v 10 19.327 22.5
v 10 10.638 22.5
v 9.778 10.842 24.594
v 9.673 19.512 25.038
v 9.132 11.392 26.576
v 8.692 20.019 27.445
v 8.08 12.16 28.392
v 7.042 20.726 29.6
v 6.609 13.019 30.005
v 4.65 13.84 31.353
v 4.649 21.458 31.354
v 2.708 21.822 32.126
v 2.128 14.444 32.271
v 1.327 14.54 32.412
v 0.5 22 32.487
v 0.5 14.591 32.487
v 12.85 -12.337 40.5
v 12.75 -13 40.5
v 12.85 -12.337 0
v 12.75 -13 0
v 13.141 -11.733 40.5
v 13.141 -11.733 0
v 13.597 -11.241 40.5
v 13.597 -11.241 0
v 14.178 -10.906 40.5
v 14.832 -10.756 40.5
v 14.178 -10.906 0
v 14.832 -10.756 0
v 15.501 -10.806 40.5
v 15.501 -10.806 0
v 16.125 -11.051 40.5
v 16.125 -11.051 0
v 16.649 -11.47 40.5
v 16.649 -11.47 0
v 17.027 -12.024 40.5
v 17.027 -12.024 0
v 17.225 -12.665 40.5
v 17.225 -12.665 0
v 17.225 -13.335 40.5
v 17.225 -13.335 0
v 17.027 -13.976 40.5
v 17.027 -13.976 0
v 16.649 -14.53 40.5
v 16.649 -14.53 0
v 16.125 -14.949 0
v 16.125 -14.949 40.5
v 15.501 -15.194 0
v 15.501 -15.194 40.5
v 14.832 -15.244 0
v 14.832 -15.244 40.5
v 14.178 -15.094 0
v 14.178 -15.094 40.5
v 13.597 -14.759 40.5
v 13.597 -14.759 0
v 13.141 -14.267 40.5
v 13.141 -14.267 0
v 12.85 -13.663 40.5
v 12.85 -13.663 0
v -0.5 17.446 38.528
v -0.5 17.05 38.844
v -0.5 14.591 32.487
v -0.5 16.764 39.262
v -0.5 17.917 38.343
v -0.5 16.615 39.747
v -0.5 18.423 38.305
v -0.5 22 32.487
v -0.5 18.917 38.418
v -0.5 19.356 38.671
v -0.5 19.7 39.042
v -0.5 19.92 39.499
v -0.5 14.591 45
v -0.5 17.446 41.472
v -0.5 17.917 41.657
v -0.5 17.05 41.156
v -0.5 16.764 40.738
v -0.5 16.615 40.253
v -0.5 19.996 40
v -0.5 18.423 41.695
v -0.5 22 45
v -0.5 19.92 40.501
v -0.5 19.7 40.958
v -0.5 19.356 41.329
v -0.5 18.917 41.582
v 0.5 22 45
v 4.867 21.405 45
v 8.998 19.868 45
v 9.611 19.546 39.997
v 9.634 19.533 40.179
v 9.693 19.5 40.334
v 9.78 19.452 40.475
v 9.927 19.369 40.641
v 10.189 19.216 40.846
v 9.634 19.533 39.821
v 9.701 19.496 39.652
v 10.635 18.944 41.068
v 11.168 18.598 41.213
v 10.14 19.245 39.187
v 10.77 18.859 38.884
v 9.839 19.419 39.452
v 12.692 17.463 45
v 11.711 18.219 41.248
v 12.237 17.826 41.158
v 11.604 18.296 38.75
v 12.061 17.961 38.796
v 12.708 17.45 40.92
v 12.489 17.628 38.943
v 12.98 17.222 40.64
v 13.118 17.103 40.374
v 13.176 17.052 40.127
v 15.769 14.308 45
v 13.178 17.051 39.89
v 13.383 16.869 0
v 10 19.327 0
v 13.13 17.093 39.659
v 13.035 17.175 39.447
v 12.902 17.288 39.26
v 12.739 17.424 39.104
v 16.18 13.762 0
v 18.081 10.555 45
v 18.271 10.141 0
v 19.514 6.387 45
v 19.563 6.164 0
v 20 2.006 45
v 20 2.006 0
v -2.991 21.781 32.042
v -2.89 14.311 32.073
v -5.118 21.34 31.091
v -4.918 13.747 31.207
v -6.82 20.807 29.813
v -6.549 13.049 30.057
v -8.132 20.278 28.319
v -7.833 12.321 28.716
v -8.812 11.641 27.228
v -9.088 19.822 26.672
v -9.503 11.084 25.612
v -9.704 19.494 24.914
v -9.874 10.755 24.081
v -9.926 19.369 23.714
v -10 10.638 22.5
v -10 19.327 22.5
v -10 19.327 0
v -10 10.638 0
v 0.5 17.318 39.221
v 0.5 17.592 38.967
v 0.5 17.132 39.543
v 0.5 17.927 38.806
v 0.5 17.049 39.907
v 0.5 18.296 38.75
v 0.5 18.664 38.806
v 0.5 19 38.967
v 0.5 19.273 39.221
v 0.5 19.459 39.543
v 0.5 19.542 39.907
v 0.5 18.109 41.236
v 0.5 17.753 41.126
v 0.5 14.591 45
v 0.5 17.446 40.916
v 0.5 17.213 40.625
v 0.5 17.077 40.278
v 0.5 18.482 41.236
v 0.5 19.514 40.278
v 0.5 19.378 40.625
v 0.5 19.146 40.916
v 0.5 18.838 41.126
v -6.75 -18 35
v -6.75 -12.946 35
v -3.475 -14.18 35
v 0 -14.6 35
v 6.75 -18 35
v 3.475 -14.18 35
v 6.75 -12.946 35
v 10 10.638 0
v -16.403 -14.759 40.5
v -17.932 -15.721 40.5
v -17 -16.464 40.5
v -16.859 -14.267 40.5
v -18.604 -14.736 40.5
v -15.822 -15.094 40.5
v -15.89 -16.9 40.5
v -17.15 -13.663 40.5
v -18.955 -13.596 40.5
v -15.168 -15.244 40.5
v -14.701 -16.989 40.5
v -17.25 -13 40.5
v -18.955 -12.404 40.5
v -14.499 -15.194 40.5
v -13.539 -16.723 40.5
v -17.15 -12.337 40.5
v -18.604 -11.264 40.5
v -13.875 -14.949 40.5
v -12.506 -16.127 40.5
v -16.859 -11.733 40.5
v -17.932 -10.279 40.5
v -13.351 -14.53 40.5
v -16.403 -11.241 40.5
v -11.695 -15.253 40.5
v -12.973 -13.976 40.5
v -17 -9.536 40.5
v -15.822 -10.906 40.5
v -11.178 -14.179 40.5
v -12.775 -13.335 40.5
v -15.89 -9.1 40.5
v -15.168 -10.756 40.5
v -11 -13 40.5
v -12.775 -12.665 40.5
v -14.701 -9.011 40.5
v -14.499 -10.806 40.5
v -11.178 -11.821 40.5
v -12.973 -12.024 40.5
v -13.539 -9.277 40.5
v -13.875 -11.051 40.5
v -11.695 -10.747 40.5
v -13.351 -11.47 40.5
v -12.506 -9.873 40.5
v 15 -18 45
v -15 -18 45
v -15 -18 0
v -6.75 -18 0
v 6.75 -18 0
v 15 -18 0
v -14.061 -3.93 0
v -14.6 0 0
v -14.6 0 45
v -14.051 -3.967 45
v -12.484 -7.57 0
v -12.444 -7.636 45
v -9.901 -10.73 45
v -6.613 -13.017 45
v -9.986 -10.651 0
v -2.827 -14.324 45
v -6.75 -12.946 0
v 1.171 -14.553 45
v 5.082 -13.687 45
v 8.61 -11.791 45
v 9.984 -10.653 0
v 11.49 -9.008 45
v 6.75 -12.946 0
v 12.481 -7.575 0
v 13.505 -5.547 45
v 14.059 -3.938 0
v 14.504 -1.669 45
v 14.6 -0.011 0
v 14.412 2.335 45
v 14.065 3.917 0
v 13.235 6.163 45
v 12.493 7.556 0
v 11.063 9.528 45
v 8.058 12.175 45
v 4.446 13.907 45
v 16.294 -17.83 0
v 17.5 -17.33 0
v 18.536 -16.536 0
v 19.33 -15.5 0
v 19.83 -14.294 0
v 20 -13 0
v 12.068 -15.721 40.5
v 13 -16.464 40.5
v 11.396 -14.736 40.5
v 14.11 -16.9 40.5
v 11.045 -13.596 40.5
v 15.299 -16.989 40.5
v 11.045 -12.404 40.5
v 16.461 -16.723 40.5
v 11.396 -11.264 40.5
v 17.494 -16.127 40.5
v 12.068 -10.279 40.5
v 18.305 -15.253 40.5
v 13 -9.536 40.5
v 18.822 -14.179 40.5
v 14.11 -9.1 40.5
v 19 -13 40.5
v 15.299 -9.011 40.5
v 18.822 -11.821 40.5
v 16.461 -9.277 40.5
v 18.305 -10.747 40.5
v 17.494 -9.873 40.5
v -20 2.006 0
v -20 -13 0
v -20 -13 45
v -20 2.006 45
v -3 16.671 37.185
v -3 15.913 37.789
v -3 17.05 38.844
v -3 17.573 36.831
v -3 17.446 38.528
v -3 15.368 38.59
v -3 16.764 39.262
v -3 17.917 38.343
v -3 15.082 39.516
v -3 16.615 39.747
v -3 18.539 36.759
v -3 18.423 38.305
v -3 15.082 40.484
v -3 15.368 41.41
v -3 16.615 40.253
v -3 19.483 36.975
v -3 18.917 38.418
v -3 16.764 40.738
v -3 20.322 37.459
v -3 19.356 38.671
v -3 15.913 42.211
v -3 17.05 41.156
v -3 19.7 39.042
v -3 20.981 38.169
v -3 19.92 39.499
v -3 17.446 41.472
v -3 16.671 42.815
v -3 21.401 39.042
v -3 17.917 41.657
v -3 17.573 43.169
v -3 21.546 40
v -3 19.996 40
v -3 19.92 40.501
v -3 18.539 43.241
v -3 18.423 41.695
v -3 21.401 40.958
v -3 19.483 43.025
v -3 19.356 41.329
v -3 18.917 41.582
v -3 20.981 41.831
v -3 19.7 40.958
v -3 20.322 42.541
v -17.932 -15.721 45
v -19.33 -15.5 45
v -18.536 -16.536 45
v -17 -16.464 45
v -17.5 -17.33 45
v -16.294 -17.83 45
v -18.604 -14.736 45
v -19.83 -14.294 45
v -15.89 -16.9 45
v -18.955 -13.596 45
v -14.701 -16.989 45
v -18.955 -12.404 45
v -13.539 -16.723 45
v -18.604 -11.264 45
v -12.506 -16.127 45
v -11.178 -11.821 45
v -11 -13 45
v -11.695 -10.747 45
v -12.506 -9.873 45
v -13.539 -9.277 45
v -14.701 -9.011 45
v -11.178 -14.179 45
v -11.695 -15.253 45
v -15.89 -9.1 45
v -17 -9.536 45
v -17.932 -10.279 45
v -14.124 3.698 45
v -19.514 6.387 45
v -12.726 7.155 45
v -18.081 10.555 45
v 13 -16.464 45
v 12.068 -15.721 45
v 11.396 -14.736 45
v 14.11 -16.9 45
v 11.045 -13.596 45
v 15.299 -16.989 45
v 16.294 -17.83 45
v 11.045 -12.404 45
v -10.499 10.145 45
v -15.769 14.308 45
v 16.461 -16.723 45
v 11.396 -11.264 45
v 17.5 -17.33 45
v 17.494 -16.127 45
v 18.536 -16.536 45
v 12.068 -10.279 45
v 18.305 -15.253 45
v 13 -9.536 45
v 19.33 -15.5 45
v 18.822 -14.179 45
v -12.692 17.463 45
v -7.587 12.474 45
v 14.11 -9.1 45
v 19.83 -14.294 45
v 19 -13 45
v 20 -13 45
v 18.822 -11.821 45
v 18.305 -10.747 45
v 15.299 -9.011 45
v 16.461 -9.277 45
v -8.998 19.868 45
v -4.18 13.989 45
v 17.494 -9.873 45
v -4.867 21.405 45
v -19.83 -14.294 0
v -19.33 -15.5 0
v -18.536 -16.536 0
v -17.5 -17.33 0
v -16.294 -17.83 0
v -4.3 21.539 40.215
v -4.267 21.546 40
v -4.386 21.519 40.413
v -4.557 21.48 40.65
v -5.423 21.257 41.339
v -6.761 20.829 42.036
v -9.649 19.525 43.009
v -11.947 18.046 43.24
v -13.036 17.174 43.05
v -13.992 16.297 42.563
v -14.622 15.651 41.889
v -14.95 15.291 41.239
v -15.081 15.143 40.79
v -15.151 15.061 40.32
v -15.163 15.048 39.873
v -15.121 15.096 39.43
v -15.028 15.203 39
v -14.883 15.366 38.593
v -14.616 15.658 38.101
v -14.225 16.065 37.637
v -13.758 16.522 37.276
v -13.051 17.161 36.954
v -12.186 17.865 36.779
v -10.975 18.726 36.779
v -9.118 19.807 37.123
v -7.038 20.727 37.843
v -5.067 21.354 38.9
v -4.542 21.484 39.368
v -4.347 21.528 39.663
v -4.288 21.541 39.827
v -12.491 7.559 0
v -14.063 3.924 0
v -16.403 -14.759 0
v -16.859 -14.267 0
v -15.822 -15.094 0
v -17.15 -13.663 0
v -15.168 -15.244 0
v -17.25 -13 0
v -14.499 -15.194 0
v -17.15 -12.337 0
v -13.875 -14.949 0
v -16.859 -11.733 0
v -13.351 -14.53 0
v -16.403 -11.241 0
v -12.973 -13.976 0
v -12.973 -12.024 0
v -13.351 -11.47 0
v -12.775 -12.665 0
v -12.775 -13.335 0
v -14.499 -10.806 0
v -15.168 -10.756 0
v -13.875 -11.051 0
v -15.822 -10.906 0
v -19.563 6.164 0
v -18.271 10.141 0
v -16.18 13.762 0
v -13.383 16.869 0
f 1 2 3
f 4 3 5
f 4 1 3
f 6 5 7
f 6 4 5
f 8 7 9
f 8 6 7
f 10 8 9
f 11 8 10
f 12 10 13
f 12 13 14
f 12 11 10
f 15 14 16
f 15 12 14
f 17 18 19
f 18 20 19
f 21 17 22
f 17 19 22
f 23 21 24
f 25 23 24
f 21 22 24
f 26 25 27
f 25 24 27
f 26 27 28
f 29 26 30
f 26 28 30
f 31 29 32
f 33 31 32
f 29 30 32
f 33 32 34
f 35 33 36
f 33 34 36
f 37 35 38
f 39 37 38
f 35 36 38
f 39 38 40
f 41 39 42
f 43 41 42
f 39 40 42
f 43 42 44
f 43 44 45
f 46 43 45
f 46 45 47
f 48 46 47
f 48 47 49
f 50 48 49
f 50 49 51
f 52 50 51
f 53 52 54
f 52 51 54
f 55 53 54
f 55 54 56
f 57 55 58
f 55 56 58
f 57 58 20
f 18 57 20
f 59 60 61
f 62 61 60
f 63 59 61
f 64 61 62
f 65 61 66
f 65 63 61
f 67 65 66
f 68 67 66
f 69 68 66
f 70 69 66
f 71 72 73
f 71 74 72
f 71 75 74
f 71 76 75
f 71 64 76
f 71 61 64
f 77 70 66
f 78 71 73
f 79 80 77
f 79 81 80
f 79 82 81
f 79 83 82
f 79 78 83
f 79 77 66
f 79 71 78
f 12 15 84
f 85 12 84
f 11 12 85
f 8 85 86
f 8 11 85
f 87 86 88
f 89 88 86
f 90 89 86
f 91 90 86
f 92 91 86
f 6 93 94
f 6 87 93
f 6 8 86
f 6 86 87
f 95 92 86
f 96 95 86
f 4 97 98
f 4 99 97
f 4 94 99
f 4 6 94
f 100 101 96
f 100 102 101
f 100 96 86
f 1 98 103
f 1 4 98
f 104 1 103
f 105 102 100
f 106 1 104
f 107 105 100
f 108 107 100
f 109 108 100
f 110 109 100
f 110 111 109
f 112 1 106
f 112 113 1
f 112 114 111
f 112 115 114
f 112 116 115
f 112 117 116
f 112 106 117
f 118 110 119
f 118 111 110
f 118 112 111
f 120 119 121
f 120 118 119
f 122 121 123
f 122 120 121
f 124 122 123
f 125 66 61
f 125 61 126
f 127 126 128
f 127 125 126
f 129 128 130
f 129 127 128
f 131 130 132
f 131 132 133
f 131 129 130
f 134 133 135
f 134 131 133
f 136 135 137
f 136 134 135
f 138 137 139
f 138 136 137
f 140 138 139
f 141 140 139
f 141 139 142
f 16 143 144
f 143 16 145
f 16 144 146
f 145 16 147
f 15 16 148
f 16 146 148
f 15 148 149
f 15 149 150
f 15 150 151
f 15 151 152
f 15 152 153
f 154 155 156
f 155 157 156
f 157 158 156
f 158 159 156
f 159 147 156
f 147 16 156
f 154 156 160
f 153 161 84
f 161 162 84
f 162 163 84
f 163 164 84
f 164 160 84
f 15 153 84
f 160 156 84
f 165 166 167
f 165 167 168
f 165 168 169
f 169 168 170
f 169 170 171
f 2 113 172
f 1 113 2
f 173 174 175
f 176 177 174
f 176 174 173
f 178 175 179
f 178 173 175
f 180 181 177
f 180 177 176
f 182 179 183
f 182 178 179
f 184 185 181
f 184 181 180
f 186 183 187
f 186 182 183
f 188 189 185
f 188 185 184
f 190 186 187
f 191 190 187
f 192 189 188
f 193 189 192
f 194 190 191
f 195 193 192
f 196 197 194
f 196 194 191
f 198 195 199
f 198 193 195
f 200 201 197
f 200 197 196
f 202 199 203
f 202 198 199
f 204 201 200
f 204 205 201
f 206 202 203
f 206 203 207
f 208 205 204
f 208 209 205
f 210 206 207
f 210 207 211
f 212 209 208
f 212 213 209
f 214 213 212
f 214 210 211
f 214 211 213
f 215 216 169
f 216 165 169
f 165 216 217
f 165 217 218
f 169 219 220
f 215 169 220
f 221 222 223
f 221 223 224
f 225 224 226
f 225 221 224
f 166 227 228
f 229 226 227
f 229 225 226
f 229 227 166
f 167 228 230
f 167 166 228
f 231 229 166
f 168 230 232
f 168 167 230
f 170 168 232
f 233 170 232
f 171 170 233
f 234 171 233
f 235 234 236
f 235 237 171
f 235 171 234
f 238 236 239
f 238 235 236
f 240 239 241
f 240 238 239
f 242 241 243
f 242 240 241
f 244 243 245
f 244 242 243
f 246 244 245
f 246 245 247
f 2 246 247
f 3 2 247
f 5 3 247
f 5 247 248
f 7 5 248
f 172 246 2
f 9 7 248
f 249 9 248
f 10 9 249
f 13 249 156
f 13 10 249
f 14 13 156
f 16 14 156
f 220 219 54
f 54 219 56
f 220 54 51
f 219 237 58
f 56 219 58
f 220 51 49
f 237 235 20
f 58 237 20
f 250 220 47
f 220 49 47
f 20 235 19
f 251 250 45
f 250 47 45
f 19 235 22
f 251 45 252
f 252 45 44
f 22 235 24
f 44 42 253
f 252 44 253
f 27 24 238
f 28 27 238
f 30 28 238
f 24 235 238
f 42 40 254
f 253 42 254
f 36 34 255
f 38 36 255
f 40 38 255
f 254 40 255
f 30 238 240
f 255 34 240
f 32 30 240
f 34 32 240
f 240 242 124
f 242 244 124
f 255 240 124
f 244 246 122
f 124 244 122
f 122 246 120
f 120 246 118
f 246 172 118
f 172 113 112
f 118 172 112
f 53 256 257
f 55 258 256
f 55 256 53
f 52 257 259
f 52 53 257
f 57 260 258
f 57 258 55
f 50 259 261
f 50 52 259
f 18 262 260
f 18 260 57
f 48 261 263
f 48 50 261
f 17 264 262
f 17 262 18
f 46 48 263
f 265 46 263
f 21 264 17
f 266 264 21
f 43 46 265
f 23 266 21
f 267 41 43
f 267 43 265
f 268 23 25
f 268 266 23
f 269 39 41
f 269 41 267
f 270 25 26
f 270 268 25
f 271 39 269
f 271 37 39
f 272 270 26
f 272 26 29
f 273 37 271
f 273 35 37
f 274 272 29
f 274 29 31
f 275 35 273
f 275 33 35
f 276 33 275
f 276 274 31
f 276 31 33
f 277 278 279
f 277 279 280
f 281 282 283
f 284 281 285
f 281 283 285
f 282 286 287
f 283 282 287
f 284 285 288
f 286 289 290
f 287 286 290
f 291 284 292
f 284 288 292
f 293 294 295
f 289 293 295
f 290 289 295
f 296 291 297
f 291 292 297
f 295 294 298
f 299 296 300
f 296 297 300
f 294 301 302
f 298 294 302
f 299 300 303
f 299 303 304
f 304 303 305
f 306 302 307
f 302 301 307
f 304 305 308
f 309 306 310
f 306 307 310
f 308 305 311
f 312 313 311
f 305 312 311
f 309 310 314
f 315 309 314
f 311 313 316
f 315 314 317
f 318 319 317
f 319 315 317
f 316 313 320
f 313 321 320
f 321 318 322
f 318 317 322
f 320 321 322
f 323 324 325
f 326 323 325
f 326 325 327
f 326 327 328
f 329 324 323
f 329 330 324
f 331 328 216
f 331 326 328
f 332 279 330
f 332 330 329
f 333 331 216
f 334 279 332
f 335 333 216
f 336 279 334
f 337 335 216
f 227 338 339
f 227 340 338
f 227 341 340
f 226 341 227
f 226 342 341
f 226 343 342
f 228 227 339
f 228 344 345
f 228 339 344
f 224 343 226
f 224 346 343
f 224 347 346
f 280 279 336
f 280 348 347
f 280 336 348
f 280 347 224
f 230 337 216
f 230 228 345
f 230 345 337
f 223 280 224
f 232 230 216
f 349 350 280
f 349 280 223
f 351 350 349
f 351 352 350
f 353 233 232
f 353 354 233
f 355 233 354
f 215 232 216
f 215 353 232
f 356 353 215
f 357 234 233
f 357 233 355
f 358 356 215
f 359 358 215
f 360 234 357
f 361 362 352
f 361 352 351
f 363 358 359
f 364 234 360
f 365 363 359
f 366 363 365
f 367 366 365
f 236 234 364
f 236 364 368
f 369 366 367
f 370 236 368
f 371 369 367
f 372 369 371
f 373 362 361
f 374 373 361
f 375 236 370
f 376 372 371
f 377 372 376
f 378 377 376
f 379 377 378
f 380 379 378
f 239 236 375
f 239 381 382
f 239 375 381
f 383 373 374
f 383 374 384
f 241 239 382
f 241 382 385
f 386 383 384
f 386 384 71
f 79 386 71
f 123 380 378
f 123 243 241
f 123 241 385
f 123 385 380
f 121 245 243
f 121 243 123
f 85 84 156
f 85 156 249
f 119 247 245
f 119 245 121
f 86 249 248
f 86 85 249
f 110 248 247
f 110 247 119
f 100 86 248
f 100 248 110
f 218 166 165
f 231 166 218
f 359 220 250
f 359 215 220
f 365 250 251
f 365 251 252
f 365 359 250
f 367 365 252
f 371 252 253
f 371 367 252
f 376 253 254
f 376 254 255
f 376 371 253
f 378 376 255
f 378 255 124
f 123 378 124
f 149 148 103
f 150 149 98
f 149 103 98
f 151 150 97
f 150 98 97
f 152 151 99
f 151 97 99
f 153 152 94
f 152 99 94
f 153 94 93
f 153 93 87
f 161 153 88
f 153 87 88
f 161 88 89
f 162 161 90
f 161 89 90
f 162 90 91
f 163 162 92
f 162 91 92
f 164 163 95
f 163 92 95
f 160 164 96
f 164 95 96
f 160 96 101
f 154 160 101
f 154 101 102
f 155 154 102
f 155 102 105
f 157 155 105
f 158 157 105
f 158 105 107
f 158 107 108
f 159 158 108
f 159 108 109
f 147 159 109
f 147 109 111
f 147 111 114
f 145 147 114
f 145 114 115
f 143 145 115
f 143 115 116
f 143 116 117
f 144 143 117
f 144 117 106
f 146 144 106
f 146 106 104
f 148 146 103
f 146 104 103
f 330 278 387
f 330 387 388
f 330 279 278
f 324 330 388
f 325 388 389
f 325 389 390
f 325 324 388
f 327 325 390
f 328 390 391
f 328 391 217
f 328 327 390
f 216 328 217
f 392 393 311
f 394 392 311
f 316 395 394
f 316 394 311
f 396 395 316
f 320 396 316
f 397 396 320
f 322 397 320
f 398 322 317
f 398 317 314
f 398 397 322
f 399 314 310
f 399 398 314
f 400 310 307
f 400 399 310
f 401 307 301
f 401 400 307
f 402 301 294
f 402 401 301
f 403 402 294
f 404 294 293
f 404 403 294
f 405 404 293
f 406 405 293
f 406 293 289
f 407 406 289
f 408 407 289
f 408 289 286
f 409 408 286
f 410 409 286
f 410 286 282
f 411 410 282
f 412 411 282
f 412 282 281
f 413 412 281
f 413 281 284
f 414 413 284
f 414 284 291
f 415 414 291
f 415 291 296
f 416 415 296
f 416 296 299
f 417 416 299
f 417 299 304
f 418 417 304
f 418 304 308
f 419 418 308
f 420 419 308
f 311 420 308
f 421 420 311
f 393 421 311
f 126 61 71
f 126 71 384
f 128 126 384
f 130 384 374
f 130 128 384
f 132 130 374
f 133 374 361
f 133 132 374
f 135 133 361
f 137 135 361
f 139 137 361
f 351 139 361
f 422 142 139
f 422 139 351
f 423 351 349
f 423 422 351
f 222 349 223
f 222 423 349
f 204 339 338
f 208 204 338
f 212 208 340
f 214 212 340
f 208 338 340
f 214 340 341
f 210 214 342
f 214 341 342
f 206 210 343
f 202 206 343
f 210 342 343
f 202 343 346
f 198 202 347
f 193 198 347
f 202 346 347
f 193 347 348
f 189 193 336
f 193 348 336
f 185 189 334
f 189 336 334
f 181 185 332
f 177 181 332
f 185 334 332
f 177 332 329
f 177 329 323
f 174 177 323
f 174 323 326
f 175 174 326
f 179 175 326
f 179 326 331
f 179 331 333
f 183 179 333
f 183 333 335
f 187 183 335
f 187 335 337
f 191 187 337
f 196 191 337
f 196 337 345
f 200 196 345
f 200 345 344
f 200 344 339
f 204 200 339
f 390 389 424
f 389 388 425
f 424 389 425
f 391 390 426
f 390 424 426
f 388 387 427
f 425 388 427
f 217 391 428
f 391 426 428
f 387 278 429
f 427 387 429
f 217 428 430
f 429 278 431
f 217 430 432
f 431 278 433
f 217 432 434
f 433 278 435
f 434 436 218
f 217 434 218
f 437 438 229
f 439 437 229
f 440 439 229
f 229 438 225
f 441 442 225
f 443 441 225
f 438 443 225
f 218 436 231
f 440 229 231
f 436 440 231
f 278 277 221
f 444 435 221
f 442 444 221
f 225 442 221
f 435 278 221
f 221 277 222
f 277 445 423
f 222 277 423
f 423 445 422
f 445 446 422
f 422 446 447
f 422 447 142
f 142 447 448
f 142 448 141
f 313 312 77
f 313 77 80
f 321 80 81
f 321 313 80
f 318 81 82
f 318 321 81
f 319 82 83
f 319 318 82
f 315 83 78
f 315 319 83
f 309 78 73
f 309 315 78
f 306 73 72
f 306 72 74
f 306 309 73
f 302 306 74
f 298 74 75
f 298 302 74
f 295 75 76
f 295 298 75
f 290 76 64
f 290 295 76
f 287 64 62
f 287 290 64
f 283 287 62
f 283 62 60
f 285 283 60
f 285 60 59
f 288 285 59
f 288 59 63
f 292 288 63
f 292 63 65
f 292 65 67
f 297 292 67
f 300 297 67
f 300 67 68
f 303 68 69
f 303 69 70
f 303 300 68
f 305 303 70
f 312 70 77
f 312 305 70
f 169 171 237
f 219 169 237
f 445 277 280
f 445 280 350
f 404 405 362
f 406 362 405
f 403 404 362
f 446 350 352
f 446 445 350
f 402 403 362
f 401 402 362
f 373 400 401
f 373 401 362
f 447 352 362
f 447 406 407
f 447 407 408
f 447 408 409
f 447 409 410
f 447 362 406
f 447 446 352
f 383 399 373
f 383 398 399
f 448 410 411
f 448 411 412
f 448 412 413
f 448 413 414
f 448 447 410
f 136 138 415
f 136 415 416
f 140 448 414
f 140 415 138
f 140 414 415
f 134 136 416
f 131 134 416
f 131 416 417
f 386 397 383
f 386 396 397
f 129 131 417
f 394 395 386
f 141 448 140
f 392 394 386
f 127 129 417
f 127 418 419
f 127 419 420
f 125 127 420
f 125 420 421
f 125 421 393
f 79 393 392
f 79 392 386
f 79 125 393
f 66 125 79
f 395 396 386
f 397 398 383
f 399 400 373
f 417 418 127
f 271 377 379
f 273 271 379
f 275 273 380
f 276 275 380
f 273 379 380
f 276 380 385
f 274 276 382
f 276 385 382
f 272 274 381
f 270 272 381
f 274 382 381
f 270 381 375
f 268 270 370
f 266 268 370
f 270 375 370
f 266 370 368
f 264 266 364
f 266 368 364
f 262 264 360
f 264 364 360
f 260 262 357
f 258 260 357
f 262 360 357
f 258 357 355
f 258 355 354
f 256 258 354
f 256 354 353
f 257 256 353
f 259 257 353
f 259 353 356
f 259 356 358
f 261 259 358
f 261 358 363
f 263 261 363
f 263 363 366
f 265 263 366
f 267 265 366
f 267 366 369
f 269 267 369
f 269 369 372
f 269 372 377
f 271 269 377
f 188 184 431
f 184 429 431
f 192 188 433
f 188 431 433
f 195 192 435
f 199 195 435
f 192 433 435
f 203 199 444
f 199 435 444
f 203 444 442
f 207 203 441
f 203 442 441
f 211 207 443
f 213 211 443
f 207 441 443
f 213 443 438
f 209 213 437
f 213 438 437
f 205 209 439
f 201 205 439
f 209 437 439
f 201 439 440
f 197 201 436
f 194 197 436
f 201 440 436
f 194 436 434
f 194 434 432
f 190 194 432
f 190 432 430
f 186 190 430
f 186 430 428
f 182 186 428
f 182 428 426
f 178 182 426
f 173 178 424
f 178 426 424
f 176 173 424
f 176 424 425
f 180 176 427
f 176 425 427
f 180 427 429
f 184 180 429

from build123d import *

# Parameters (mm, degrees)
SKETCH_1_W                     = 40
SKETCH_1_H                     = 40
SKETCH_1_R                     = 14.6
EXTRUDE_1_DEPTH                = 45
SKETCH_6_W                     = 1
SKETCH_6_H                     = 22
CUT_EXTRUDE_1_DEPTH            = 54.935146241
M3X0_5_1_D                     = 2.5
HOLE_START                     = -21
HOLE_WIZARD_M3_2_OUTLINE_R     = 3.25
HOLE_WIZARD_M3_2_OUTLINE_R_2   = 1.25
HOLE_WIZARD_M3_2_DEPTH         = 18
HOLE_START_2                   = -3
HOLE_WIZARD_M3_2_2_OUTLINE_R   = 1.7
HOLE_WIZARD_M3_2_2_OUTLINE_R_2 = 1.25
HOLE_WIZARD_M3_2_2_DEPTH       = 2.5
HOLE_WIZARD_M4_1_D             = 4.5
HOLE_WIZARD_M4_1_CBORE_D       = 8
HOLE_WIZARD_M4_1_CBORE_DEPTH   = 4.5
CUT_EXTRUDE_2_REACH            = 65.443
CUT_EXTRUDE_2_END_RADIUS       = 14.6
SKETCH_10_W                    = 13.5
SKETCH_10_H                    = 35
CUT_EXTRUDE_3_DEPTH            = 54.935146365
FILLET_3_DEPTH                 = 45
FILLET_4_R                     = 5


with BuildPart() as part:
    # 草圖1 → 填料-伸長1 (new body)
    with BuildSketch(Plane.XY):
        with Locations((0, 2)):
            Rectangle(SKETCH_1_W, SKETCH_1_H)
        with Locations(Location((0, 0, 0), (0, 0, 180))):
            Circle(SKETCH_1_R, mode=Mode.SUBTRACT)
    extrude(amount=EXTRUDE_1_DEPTH)

    # 草圖6 → 除料-伸長1 (cut, through all)
    with BuildSketch(Plane.XY.offset(45)):
        with Locations((0, 11)):
            Rectangle(SKETCH_6_W, SKETCH_6_H)
    extrude(amount=-CUT_EXTRUDE_1_DEPTH, mode=Mode.SUBTRACT)

    # M3x0.5 螺紋孔1 (through all)
    with Locations(Plane.ZY.offset(20)):
        with Locations((40, 18.295717922)):
            Hole(M3X0_5_1_D / 2)

    # M3 凹頭蓋螺釘的柱孔2: read off the stored shape, not the designer's step
    # M3 凹頭蓋螺釘的柱孔2 outline → M3 凹頭蓋螺釘的柱孔2 (cut)
    with BuildSketch(Plane.YZ.offset(HOLE_START)):
        with Locations((18.295717922, 40)):
            Circle(HOLE_WIZARD_M3_2_OUTLINE_R)
        with Locations((18.295717922, 40)):
            Circle(HOLE_WIZARD_M3_2_OUTLINE_R_2, mode=Mode.SUBTRACT)
    extrude(amount=HOLE_WIZARD_M3_2_DEPTH, mode=Mode.SUBTRACT)

    # Hole Wizard M3 _2 2 outline → Hole Wizard M3 _2 2 (cut)
    with BuildSketch(Plane.YZ.offset(HOLE_START_2)):
        with Locations((18.295717922, 40)):
            Circle(HOLE_WIZARD_M3_2_2_OUTLINE_R)
        with Locations((18.295717922, 40)):
            Circle(HOLE_WIZARD_M3_2_2_OUTLINE_R_2, mode=Mode.SUBTRACT)
    extrude(amount=HOLE_WIZARD_M3_2_2_DEPTH, mode=Mode.SUBTRACT)

    # M4 凹頭蓋螺釘的柱孔1 (through all)
    with Locations(Plane.XY.offset(45)):
        with Locations((15, -13), (-15, -13)):
            CounterBoreHole(HOLE_WIZARD_M4_1_D / 2, HOLE_WIZARD_M4_1_CBORE_D / 2, HOLE_WIZARD_M4_1_CBORE_DEPTH)

    # 除料-伸長2: up to this cylinder (the profile starts outside it)
    cut_extrude_2_end = Plane(origin=(0, 0, 15.25905), z_dir=(0, 0, -1)) * Cylinder(CUT_EXTRUDE_2_END_RADIUS, 161.086, mode=Mode.PRIVATE)
    # 草圖9 → 除料-伸長2 (cut, up to the surface)
    with BuildSketch(Plane.XZ.offset(-22), mode=Mode.PRIVATE) as cut_extrude_2_sk1:
        with BuildLine():
            Line((-10, 0), (10, 0))
            Line((10, 0), (10, 22.5))
            ThreePointArc((10, 22.5), (0, 32.5), (-10, 22.5))
            Line((-10, 22.5), (-10, 0))
        make_face()
    cut_extrude_2_tool1 = extrude(cut_extrude_2_sk1.sketch, amount=CUT_EXTRUDE_2_REACH, mode=Mode.PRIVATE) - cut_extrude_2_end
    add(cut_extrude_2_tool1.solids().sort_by_distance((0, 22, 15.25905))[0], mode=Mode.SUBTRACT)

    # 草圖10 → 除料-伸長3 (cut, through all)
    with BuildSketch(Plane(origin=(0, 0, 0), x_dir=(1, 0, 0), z_dir=(0, 1, 0))):
        with Locations((0, -17.5)):
            Rectangle(SKETCH_10_W, SKETCH_10_H)
    extrude(amount=-CUT_EXTRUDE_3_DEPTH, mode=Mode.SUBTRACT)

    # 圓角3: read off the stored shape, not the designer's step
    # 圓角3 outline → 圓角3 (cut)
    with BuildSketch(Plane.XY):
        with BuildLine():
            Line((20, 2.006250977), (20, 22))
            Line((20, 22), (0.5, 22))
            ThreePointArc((0.5, 22), (14.317821063, 15.970491021), (20, 2.006250977))
        make_face()
        with BuildLine():
            Line((-20, 22), (-20, 2.006250977))
            ThreePointArc((-20, 2.006250977), (-14.317821063, 15.970491021), (-0.5, 22))
            Line((-0.5, 22), (-20, 22))
        make_face()
    extrude(amount=FILLET_3_DEPTH, mode=Mode.SUBTRACT)

    # 圓角4
    fillet_4_edges = [part.edges().sort_by_distance(p)[0] for p in [
        (20, -18, 22.5),
        (-20, -18, 22.5),
    ]]
    fillet(fillet_4_edges, radius=FILLET_4_R)


solid = part.part
